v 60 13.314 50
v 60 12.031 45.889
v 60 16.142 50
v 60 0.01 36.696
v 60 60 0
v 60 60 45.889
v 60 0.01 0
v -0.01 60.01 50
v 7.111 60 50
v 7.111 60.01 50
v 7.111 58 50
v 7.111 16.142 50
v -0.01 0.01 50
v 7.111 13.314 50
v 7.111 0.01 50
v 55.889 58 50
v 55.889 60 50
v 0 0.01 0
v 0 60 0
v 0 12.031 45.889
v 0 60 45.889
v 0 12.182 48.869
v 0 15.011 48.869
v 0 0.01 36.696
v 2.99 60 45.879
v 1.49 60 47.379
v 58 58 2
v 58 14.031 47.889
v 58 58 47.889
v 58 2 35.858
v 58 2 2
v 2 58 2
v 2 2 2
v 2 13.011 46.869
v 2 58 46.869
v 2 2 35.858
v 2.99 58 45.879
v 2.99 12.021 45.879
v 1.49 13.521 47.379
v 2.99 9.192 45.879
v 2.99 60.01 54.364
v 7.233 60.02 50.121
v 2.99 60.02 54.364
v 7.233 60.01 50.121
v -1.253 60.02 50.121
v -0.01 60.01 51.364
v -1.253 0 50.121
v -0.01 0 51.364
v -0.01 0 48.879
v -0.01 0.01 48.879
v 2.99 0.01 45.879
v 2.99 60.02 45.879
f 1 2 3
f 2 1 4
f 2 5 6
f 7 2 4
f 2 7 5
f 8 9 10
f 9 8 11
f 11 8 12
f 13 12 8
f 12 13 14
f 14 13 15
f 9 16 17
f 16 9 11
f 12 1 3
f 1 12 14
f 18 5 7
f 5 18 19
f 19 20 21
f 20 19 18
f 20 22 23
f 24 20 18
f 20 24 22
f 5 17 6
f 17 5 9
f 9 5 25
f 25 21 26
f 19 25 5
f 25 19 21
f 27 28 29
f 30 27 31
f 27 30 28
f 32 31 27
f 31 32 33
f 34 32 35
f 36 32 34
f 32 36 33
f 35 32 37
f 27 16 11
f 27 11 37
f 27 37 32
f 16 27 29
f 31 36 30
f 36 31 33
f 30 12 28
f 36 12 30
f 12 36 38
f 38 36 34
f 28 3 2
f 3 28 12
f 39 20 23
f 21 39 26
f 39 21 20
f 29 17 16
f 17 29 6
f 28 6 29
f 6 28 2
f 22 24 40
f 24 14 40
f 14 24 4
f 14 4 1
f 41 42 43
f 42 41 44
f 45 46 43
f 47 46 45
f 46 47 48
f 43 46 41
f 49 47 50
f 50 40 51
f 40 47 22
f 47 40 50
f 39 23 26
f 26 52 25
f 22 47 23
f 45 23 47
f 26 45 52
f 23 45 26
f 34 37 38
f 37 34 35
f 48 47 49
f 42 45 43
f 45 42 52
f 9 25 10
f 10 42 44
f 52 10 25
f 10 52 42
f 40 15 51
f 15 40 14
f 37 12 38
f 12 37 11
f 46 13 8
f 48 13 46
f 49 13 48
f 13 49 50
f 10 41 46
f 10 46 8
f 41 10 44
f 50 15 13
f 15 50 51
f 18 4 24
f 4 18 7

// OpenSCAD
width = 60;
depth = 60;
height = 50;

thickness = 2;
labelHeight = 20;
codeWidth = 3;
epsilon = 0.01;


difference () {
  union () {
    difference() {
      cube([width, depth, height]);
      translate([thickness, thickness, thickness]) cube([width-thickness*2, depth-thickness*2, height]);

      translate([-epsilon,0,height-thickness-labelHeight*0.7071]) rotate(45, v=[1,0,0]) cube([width + 2 * epsilon, labelHeight*2, labelHeight]);
      translate([-epsilon,0,height-thickness-codeWidth*0.7071]) rotate(90) rotate(45, v=[1,0,0]) cube([width + 2 * epsilon, codeWidth*2, codeWidth*2]);
      translate([width+epsilon,depth,height-thickness-codeWidth*0.7071]) rotate(-90) rotate(45, v=[1,0,0]) cube([width + 2 * epsilon, codeWidth*2, codeWidth*2]);

    }
    translate([0,0,height-thickness-labelHeight*0.7071]) rotate(45, v=[1,0,0]) cube([width, labelHeight*2, thickness]);
    translate([-epsilon+codeWidth,0,height-thickness-codeWidth*0.7071]) rotate(90) rotate(45, v=[1,0,0]) cube([width + 2 * epsilon, codeWidth*2, codeWidth*2]);
  }


  translate([-epsilon,-epsilon,height]) cube([width+2*epsilon, depth+2*epsilon, height]);
  translate([-epsilon,-depth -epsilon,0]) cube([width+2*epsilon, depth+2*epsilon, height]);

}
